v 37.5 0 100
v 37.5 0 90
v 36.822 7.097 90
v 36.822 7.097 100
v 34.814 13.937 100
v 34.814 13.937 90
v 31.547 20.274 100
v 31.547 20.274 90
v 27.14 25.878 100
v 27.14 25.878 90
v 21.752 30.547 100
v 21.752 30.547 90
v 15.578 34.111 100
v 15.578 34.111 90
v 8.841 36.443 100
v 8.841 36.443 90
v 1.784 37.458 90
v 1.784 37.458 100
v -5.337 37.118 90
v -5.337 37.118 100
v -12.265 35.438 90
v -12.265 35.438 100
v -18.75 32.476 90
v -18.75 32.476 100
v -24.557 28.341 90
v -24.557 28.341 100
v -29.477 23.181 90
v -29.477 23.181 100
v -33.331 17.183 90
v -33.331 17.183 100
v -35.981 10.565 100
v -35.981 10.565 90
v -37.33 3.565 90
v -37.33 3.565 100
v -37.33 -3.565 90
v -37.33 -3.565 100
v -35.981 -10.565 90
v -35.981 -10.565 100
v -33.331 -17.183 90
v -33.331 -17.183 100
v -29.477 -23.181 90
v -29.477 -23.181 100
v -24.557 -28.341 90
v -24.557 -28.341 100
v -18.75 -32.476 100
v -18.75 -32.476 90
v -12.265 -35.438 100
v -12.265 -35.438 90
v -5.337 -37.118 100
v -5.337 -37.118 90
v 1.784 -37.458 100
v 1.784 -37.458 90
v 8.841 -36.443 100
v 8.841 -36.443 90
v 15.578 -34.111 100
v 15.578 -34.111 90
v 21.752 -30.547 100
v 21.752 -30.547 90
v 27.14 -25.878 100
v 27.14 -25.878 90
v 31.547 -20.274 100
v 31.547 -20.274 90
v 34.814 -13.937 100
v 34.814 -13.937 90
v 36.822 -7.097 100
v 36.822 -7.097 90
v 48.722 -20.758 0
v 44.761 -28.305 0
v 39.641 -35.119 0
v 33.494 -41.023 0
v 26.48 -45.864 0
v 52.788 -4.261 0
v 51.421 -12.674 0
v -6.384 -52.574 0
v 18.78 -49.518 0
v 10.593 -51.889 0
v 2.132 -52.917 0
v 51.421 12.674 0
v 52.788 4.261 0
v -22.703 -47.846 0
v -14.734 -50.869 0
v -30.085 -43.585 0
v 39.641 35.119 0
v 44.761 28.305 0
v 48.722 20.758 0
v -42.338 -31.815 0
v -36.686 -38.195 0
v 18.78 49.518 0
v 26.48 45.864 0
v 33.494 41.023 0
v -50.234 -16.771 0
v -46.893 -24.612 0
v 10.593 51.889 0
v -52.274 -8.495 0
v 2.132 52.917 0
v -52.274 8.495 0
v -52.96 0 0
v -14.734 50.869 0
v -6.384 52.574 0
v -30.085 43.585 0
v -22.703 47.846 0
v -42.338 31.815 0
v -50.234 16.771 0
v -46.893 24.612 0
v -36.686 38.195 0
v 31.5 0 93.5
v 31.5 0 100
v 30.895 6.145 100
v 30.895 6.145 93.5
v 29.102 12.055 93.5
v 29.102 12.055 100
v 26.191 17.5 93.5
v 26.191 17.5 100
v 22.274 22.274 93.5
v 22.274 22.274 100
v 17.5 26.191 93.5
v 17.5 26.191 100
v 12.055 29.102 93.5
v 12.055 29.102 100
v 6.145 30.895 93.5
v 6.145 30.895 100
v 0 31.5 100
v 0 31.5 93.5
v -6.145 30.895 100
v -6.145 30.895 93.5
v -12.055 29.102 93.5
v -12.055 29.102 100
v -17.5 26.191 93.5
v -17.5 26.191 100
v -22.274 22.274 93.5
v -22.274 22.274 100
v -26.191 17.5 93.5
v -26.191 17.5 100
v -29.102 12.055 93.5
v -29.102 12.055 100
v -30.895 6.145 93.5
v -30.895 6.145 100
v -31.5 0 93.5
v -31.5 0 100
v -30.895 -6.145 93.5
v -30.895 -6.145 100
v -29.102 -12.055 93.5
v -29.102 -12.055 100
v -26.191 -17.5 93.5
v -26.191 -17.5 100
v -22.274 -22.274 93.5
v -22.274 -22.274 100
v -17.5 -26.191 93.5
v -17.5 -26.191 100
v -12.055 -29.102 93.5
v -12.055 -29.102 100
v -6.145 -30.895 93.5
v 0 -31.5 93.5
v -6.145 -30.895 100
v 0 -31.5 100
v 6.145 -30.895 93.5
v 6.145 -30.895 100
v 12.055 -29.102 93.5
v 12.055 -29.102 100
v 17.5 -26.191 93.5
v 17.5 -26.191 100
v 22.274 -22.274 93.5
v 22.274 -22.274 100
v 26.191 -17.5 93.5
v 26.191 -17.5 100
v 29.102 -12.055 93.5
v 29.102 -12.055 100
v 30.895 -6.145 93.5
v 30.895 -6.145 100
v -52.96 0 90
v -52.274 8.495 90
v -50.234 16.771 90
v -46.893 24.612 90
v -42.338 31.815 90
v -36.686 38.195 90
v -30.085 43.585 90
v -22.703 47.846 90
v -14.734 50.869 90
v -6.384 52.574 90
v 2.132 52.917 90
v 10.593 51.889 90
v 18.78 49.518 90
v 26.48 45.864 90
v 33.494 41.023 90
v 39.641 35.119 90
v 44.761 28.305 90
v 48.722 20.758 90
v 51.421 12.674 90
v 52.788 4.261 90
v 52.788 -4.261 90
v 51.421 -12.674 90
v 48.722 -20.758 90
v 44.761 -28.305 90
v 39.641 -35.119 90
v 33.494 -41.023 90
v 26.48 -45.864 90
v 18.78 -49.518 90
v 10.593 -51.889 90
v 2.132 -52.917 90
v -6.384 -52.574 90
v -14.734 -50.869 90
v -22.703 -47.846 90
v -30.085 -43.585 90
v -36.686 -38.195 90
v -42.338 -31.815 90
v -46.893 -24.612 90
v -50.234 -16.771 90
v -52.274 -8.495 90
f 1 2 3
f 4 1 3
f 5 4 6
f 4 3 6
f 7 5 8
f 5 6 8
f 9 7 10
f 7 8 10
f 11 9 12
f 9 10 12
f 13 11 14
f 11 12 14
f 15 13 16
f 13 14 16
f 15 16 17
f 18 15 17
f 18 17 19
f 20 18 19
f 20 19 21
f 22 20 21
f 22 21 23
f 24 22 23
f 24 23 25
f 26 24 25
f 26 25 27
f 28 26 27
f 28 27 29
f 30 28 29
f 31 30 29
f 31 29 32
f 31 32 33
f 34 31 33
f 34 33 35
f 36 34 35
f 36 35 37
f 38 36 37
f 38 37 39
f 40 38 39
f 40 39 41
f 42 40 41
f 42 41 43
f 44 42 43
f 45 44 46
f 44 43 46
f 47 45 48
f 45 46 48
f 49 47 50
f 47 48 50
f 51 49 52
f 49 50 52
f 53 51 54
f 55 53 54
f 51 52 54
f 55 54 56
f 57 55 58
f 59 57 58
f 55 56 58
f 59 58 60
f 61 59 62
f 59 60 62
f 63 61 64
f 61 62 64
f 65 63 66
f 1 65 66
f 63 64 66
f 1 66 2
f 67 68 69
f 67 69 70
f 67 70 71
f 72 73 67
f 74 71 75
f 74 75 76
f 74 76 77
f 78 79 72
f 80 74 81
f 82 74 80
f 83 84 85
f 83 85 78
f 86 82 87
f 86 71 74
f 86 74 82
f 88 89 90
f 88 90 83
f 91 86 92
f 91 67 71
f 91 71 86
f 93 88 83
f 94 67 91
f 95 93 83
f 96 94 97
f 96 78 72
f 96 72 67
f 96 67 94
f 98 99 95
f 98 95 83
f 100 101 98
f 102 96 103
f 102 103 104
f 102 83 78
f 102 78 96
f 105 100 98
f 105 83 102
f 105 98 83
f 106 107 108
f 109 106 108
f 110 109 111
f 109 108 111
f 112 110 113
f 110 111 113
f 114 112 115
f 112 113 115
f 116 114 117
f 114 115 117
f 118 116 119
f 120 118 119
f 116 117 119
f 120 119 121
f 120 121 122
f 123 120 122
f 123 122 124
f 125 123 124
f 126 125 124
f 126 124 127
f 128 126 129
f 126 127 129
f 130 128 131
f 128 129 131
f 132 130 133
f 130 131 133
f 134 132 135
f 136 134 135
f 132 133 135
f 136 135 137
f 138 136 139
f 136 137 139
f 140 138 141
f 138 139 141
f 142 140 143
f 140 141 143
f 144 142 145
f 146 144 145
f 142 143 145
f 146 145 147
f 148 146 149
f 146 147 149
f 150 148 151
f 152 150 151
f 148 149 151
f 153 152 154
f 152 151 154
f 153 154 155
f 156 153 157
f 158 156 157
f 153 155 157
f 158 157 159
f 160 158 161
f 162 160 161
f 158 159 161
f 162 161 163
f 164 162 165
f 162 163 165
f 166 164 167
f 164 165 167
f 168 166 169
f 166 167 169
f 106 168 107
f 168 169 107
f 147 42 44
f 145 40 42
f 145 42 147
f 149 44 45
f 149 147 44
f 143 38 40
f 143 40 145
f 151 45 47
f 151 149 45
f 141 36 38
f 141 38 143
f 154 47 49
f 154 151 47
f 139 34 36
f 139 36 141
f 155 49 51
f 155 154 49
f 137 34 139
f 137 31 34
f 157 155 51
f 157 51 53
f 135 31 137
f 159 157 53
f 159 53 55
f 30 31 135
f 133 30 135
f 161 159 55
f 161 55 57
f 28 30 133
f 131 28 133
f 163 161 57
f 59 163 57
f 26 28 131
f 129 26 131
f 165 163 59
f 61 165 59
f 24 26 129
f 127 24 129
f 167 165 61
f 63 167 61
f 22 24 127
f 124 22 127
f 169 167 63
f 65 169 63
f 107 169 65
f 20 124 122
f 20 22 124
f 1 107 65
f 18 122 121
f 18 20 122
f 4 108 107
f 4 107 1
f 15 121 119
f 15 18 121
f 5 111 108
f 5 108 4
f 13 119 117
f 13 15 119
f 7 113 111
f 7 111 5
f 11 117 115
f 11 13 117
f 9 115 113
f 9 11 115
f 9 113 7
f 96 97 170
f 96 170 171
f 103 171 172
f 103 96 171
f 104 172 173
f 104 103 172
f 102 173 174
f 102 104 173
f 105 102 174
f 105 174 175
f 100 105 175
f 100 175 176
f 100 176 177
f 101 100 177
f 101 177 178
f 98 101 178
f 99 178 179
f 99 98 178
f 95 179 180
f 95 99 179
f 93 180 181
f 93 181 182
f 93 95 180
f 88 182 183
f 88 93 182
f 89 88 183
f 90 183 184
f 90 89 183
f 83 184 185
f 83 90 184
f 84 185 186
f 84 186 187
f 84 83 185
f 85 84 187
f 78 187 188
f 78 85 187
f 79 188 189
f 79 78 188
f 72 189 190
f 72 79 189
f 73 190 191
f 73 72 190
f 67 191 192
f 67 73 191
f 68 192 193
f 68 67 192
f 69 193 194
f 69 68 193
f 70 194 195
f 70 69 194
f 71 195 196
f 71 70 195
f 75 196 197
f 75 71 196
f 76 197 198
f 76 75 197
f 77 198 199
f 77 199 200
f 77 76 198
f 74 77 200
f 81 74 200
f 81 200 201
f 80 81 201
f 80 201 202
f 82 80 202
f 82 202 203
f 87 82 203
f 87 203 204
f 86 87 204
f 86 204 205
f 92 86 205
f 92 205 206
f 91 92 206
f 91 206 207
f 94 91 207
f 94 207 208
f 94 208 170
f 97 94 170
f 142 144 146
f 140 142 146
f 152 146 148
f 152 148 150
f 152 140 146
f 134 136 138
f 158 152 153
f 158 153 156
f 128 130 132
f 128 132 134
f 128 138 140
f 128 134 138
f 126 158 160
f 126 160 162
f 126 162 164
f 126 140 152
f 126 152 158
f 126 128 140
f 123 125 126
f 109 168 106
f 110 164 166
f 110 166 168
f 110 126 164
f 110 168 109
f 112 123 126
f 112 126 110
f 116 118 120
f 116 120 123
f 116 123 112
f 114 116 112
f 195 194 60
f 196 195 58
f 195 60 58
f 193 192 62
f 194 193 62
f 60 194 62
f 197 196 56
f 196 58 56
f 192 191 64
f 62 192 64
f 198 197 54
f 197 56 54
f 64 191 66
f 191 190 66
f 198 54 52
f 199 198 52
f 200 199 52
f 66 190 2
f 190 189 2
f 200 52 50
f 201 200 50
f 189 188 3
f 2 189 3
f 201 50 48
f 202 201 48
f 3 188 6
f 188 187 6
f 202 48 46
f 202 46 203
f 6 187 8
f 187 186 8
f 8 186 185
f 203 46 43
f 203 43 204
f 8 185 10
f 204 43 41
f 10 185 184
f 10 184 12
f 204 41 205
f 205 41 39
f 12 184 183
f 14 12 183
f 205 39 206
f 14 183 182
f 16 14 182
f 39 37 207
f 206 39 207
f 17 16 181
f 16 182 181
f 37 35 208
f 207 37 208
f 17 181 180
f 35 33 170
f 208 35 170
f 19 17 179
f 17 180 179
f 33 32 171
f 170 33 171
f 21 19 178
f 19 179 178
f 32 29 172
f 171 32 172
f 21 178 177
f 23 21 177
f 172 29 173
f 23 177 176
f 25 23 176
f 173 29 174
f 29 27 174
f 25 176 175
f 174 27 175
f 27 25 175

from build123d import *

# Parameters (mm, degrees)
SKETCH1_R           = 37.5
BOSS_EXTRUDE1_DEPTH = 100
SKETCH2_R           = 31.5
CUT_EXTRUDE1_DEPTH  = 6.5
SKETCH3_R           = 52.959705575
BOSS_EXTRUDE2_DEPTH = 90


with BuildPart() as part:
    # Sketch1 → Boss-Extrude1 (new body)
    with BuildSketch(Plane.XY):
        Circle(SKETCH1_R)
    extrude(amount=BOSS_EXTRUDE1_DEPTH)

    # Sketch2 → Cut-Extrude1 (cut)
    with BuildSketch(Plane.XY.offset(100)):
        Circle(SKETCH2_R)
    extrude(amount=-CUT_EXTRUDE1_DEPTH, mode=Mode.SUBTRACT)

    # Sketch3 → Boss-Extrude2 (add)
    with BuildSketch(Plane(origin=(0, 0, 0), x_dir=(-1, 0, 0), z_dir=(0, 0, -1))):
        Circle(SKETCH3_R)
    extrude(amount=-BOSS_EXTRUDE2_DEPTH)


solid = part.part
